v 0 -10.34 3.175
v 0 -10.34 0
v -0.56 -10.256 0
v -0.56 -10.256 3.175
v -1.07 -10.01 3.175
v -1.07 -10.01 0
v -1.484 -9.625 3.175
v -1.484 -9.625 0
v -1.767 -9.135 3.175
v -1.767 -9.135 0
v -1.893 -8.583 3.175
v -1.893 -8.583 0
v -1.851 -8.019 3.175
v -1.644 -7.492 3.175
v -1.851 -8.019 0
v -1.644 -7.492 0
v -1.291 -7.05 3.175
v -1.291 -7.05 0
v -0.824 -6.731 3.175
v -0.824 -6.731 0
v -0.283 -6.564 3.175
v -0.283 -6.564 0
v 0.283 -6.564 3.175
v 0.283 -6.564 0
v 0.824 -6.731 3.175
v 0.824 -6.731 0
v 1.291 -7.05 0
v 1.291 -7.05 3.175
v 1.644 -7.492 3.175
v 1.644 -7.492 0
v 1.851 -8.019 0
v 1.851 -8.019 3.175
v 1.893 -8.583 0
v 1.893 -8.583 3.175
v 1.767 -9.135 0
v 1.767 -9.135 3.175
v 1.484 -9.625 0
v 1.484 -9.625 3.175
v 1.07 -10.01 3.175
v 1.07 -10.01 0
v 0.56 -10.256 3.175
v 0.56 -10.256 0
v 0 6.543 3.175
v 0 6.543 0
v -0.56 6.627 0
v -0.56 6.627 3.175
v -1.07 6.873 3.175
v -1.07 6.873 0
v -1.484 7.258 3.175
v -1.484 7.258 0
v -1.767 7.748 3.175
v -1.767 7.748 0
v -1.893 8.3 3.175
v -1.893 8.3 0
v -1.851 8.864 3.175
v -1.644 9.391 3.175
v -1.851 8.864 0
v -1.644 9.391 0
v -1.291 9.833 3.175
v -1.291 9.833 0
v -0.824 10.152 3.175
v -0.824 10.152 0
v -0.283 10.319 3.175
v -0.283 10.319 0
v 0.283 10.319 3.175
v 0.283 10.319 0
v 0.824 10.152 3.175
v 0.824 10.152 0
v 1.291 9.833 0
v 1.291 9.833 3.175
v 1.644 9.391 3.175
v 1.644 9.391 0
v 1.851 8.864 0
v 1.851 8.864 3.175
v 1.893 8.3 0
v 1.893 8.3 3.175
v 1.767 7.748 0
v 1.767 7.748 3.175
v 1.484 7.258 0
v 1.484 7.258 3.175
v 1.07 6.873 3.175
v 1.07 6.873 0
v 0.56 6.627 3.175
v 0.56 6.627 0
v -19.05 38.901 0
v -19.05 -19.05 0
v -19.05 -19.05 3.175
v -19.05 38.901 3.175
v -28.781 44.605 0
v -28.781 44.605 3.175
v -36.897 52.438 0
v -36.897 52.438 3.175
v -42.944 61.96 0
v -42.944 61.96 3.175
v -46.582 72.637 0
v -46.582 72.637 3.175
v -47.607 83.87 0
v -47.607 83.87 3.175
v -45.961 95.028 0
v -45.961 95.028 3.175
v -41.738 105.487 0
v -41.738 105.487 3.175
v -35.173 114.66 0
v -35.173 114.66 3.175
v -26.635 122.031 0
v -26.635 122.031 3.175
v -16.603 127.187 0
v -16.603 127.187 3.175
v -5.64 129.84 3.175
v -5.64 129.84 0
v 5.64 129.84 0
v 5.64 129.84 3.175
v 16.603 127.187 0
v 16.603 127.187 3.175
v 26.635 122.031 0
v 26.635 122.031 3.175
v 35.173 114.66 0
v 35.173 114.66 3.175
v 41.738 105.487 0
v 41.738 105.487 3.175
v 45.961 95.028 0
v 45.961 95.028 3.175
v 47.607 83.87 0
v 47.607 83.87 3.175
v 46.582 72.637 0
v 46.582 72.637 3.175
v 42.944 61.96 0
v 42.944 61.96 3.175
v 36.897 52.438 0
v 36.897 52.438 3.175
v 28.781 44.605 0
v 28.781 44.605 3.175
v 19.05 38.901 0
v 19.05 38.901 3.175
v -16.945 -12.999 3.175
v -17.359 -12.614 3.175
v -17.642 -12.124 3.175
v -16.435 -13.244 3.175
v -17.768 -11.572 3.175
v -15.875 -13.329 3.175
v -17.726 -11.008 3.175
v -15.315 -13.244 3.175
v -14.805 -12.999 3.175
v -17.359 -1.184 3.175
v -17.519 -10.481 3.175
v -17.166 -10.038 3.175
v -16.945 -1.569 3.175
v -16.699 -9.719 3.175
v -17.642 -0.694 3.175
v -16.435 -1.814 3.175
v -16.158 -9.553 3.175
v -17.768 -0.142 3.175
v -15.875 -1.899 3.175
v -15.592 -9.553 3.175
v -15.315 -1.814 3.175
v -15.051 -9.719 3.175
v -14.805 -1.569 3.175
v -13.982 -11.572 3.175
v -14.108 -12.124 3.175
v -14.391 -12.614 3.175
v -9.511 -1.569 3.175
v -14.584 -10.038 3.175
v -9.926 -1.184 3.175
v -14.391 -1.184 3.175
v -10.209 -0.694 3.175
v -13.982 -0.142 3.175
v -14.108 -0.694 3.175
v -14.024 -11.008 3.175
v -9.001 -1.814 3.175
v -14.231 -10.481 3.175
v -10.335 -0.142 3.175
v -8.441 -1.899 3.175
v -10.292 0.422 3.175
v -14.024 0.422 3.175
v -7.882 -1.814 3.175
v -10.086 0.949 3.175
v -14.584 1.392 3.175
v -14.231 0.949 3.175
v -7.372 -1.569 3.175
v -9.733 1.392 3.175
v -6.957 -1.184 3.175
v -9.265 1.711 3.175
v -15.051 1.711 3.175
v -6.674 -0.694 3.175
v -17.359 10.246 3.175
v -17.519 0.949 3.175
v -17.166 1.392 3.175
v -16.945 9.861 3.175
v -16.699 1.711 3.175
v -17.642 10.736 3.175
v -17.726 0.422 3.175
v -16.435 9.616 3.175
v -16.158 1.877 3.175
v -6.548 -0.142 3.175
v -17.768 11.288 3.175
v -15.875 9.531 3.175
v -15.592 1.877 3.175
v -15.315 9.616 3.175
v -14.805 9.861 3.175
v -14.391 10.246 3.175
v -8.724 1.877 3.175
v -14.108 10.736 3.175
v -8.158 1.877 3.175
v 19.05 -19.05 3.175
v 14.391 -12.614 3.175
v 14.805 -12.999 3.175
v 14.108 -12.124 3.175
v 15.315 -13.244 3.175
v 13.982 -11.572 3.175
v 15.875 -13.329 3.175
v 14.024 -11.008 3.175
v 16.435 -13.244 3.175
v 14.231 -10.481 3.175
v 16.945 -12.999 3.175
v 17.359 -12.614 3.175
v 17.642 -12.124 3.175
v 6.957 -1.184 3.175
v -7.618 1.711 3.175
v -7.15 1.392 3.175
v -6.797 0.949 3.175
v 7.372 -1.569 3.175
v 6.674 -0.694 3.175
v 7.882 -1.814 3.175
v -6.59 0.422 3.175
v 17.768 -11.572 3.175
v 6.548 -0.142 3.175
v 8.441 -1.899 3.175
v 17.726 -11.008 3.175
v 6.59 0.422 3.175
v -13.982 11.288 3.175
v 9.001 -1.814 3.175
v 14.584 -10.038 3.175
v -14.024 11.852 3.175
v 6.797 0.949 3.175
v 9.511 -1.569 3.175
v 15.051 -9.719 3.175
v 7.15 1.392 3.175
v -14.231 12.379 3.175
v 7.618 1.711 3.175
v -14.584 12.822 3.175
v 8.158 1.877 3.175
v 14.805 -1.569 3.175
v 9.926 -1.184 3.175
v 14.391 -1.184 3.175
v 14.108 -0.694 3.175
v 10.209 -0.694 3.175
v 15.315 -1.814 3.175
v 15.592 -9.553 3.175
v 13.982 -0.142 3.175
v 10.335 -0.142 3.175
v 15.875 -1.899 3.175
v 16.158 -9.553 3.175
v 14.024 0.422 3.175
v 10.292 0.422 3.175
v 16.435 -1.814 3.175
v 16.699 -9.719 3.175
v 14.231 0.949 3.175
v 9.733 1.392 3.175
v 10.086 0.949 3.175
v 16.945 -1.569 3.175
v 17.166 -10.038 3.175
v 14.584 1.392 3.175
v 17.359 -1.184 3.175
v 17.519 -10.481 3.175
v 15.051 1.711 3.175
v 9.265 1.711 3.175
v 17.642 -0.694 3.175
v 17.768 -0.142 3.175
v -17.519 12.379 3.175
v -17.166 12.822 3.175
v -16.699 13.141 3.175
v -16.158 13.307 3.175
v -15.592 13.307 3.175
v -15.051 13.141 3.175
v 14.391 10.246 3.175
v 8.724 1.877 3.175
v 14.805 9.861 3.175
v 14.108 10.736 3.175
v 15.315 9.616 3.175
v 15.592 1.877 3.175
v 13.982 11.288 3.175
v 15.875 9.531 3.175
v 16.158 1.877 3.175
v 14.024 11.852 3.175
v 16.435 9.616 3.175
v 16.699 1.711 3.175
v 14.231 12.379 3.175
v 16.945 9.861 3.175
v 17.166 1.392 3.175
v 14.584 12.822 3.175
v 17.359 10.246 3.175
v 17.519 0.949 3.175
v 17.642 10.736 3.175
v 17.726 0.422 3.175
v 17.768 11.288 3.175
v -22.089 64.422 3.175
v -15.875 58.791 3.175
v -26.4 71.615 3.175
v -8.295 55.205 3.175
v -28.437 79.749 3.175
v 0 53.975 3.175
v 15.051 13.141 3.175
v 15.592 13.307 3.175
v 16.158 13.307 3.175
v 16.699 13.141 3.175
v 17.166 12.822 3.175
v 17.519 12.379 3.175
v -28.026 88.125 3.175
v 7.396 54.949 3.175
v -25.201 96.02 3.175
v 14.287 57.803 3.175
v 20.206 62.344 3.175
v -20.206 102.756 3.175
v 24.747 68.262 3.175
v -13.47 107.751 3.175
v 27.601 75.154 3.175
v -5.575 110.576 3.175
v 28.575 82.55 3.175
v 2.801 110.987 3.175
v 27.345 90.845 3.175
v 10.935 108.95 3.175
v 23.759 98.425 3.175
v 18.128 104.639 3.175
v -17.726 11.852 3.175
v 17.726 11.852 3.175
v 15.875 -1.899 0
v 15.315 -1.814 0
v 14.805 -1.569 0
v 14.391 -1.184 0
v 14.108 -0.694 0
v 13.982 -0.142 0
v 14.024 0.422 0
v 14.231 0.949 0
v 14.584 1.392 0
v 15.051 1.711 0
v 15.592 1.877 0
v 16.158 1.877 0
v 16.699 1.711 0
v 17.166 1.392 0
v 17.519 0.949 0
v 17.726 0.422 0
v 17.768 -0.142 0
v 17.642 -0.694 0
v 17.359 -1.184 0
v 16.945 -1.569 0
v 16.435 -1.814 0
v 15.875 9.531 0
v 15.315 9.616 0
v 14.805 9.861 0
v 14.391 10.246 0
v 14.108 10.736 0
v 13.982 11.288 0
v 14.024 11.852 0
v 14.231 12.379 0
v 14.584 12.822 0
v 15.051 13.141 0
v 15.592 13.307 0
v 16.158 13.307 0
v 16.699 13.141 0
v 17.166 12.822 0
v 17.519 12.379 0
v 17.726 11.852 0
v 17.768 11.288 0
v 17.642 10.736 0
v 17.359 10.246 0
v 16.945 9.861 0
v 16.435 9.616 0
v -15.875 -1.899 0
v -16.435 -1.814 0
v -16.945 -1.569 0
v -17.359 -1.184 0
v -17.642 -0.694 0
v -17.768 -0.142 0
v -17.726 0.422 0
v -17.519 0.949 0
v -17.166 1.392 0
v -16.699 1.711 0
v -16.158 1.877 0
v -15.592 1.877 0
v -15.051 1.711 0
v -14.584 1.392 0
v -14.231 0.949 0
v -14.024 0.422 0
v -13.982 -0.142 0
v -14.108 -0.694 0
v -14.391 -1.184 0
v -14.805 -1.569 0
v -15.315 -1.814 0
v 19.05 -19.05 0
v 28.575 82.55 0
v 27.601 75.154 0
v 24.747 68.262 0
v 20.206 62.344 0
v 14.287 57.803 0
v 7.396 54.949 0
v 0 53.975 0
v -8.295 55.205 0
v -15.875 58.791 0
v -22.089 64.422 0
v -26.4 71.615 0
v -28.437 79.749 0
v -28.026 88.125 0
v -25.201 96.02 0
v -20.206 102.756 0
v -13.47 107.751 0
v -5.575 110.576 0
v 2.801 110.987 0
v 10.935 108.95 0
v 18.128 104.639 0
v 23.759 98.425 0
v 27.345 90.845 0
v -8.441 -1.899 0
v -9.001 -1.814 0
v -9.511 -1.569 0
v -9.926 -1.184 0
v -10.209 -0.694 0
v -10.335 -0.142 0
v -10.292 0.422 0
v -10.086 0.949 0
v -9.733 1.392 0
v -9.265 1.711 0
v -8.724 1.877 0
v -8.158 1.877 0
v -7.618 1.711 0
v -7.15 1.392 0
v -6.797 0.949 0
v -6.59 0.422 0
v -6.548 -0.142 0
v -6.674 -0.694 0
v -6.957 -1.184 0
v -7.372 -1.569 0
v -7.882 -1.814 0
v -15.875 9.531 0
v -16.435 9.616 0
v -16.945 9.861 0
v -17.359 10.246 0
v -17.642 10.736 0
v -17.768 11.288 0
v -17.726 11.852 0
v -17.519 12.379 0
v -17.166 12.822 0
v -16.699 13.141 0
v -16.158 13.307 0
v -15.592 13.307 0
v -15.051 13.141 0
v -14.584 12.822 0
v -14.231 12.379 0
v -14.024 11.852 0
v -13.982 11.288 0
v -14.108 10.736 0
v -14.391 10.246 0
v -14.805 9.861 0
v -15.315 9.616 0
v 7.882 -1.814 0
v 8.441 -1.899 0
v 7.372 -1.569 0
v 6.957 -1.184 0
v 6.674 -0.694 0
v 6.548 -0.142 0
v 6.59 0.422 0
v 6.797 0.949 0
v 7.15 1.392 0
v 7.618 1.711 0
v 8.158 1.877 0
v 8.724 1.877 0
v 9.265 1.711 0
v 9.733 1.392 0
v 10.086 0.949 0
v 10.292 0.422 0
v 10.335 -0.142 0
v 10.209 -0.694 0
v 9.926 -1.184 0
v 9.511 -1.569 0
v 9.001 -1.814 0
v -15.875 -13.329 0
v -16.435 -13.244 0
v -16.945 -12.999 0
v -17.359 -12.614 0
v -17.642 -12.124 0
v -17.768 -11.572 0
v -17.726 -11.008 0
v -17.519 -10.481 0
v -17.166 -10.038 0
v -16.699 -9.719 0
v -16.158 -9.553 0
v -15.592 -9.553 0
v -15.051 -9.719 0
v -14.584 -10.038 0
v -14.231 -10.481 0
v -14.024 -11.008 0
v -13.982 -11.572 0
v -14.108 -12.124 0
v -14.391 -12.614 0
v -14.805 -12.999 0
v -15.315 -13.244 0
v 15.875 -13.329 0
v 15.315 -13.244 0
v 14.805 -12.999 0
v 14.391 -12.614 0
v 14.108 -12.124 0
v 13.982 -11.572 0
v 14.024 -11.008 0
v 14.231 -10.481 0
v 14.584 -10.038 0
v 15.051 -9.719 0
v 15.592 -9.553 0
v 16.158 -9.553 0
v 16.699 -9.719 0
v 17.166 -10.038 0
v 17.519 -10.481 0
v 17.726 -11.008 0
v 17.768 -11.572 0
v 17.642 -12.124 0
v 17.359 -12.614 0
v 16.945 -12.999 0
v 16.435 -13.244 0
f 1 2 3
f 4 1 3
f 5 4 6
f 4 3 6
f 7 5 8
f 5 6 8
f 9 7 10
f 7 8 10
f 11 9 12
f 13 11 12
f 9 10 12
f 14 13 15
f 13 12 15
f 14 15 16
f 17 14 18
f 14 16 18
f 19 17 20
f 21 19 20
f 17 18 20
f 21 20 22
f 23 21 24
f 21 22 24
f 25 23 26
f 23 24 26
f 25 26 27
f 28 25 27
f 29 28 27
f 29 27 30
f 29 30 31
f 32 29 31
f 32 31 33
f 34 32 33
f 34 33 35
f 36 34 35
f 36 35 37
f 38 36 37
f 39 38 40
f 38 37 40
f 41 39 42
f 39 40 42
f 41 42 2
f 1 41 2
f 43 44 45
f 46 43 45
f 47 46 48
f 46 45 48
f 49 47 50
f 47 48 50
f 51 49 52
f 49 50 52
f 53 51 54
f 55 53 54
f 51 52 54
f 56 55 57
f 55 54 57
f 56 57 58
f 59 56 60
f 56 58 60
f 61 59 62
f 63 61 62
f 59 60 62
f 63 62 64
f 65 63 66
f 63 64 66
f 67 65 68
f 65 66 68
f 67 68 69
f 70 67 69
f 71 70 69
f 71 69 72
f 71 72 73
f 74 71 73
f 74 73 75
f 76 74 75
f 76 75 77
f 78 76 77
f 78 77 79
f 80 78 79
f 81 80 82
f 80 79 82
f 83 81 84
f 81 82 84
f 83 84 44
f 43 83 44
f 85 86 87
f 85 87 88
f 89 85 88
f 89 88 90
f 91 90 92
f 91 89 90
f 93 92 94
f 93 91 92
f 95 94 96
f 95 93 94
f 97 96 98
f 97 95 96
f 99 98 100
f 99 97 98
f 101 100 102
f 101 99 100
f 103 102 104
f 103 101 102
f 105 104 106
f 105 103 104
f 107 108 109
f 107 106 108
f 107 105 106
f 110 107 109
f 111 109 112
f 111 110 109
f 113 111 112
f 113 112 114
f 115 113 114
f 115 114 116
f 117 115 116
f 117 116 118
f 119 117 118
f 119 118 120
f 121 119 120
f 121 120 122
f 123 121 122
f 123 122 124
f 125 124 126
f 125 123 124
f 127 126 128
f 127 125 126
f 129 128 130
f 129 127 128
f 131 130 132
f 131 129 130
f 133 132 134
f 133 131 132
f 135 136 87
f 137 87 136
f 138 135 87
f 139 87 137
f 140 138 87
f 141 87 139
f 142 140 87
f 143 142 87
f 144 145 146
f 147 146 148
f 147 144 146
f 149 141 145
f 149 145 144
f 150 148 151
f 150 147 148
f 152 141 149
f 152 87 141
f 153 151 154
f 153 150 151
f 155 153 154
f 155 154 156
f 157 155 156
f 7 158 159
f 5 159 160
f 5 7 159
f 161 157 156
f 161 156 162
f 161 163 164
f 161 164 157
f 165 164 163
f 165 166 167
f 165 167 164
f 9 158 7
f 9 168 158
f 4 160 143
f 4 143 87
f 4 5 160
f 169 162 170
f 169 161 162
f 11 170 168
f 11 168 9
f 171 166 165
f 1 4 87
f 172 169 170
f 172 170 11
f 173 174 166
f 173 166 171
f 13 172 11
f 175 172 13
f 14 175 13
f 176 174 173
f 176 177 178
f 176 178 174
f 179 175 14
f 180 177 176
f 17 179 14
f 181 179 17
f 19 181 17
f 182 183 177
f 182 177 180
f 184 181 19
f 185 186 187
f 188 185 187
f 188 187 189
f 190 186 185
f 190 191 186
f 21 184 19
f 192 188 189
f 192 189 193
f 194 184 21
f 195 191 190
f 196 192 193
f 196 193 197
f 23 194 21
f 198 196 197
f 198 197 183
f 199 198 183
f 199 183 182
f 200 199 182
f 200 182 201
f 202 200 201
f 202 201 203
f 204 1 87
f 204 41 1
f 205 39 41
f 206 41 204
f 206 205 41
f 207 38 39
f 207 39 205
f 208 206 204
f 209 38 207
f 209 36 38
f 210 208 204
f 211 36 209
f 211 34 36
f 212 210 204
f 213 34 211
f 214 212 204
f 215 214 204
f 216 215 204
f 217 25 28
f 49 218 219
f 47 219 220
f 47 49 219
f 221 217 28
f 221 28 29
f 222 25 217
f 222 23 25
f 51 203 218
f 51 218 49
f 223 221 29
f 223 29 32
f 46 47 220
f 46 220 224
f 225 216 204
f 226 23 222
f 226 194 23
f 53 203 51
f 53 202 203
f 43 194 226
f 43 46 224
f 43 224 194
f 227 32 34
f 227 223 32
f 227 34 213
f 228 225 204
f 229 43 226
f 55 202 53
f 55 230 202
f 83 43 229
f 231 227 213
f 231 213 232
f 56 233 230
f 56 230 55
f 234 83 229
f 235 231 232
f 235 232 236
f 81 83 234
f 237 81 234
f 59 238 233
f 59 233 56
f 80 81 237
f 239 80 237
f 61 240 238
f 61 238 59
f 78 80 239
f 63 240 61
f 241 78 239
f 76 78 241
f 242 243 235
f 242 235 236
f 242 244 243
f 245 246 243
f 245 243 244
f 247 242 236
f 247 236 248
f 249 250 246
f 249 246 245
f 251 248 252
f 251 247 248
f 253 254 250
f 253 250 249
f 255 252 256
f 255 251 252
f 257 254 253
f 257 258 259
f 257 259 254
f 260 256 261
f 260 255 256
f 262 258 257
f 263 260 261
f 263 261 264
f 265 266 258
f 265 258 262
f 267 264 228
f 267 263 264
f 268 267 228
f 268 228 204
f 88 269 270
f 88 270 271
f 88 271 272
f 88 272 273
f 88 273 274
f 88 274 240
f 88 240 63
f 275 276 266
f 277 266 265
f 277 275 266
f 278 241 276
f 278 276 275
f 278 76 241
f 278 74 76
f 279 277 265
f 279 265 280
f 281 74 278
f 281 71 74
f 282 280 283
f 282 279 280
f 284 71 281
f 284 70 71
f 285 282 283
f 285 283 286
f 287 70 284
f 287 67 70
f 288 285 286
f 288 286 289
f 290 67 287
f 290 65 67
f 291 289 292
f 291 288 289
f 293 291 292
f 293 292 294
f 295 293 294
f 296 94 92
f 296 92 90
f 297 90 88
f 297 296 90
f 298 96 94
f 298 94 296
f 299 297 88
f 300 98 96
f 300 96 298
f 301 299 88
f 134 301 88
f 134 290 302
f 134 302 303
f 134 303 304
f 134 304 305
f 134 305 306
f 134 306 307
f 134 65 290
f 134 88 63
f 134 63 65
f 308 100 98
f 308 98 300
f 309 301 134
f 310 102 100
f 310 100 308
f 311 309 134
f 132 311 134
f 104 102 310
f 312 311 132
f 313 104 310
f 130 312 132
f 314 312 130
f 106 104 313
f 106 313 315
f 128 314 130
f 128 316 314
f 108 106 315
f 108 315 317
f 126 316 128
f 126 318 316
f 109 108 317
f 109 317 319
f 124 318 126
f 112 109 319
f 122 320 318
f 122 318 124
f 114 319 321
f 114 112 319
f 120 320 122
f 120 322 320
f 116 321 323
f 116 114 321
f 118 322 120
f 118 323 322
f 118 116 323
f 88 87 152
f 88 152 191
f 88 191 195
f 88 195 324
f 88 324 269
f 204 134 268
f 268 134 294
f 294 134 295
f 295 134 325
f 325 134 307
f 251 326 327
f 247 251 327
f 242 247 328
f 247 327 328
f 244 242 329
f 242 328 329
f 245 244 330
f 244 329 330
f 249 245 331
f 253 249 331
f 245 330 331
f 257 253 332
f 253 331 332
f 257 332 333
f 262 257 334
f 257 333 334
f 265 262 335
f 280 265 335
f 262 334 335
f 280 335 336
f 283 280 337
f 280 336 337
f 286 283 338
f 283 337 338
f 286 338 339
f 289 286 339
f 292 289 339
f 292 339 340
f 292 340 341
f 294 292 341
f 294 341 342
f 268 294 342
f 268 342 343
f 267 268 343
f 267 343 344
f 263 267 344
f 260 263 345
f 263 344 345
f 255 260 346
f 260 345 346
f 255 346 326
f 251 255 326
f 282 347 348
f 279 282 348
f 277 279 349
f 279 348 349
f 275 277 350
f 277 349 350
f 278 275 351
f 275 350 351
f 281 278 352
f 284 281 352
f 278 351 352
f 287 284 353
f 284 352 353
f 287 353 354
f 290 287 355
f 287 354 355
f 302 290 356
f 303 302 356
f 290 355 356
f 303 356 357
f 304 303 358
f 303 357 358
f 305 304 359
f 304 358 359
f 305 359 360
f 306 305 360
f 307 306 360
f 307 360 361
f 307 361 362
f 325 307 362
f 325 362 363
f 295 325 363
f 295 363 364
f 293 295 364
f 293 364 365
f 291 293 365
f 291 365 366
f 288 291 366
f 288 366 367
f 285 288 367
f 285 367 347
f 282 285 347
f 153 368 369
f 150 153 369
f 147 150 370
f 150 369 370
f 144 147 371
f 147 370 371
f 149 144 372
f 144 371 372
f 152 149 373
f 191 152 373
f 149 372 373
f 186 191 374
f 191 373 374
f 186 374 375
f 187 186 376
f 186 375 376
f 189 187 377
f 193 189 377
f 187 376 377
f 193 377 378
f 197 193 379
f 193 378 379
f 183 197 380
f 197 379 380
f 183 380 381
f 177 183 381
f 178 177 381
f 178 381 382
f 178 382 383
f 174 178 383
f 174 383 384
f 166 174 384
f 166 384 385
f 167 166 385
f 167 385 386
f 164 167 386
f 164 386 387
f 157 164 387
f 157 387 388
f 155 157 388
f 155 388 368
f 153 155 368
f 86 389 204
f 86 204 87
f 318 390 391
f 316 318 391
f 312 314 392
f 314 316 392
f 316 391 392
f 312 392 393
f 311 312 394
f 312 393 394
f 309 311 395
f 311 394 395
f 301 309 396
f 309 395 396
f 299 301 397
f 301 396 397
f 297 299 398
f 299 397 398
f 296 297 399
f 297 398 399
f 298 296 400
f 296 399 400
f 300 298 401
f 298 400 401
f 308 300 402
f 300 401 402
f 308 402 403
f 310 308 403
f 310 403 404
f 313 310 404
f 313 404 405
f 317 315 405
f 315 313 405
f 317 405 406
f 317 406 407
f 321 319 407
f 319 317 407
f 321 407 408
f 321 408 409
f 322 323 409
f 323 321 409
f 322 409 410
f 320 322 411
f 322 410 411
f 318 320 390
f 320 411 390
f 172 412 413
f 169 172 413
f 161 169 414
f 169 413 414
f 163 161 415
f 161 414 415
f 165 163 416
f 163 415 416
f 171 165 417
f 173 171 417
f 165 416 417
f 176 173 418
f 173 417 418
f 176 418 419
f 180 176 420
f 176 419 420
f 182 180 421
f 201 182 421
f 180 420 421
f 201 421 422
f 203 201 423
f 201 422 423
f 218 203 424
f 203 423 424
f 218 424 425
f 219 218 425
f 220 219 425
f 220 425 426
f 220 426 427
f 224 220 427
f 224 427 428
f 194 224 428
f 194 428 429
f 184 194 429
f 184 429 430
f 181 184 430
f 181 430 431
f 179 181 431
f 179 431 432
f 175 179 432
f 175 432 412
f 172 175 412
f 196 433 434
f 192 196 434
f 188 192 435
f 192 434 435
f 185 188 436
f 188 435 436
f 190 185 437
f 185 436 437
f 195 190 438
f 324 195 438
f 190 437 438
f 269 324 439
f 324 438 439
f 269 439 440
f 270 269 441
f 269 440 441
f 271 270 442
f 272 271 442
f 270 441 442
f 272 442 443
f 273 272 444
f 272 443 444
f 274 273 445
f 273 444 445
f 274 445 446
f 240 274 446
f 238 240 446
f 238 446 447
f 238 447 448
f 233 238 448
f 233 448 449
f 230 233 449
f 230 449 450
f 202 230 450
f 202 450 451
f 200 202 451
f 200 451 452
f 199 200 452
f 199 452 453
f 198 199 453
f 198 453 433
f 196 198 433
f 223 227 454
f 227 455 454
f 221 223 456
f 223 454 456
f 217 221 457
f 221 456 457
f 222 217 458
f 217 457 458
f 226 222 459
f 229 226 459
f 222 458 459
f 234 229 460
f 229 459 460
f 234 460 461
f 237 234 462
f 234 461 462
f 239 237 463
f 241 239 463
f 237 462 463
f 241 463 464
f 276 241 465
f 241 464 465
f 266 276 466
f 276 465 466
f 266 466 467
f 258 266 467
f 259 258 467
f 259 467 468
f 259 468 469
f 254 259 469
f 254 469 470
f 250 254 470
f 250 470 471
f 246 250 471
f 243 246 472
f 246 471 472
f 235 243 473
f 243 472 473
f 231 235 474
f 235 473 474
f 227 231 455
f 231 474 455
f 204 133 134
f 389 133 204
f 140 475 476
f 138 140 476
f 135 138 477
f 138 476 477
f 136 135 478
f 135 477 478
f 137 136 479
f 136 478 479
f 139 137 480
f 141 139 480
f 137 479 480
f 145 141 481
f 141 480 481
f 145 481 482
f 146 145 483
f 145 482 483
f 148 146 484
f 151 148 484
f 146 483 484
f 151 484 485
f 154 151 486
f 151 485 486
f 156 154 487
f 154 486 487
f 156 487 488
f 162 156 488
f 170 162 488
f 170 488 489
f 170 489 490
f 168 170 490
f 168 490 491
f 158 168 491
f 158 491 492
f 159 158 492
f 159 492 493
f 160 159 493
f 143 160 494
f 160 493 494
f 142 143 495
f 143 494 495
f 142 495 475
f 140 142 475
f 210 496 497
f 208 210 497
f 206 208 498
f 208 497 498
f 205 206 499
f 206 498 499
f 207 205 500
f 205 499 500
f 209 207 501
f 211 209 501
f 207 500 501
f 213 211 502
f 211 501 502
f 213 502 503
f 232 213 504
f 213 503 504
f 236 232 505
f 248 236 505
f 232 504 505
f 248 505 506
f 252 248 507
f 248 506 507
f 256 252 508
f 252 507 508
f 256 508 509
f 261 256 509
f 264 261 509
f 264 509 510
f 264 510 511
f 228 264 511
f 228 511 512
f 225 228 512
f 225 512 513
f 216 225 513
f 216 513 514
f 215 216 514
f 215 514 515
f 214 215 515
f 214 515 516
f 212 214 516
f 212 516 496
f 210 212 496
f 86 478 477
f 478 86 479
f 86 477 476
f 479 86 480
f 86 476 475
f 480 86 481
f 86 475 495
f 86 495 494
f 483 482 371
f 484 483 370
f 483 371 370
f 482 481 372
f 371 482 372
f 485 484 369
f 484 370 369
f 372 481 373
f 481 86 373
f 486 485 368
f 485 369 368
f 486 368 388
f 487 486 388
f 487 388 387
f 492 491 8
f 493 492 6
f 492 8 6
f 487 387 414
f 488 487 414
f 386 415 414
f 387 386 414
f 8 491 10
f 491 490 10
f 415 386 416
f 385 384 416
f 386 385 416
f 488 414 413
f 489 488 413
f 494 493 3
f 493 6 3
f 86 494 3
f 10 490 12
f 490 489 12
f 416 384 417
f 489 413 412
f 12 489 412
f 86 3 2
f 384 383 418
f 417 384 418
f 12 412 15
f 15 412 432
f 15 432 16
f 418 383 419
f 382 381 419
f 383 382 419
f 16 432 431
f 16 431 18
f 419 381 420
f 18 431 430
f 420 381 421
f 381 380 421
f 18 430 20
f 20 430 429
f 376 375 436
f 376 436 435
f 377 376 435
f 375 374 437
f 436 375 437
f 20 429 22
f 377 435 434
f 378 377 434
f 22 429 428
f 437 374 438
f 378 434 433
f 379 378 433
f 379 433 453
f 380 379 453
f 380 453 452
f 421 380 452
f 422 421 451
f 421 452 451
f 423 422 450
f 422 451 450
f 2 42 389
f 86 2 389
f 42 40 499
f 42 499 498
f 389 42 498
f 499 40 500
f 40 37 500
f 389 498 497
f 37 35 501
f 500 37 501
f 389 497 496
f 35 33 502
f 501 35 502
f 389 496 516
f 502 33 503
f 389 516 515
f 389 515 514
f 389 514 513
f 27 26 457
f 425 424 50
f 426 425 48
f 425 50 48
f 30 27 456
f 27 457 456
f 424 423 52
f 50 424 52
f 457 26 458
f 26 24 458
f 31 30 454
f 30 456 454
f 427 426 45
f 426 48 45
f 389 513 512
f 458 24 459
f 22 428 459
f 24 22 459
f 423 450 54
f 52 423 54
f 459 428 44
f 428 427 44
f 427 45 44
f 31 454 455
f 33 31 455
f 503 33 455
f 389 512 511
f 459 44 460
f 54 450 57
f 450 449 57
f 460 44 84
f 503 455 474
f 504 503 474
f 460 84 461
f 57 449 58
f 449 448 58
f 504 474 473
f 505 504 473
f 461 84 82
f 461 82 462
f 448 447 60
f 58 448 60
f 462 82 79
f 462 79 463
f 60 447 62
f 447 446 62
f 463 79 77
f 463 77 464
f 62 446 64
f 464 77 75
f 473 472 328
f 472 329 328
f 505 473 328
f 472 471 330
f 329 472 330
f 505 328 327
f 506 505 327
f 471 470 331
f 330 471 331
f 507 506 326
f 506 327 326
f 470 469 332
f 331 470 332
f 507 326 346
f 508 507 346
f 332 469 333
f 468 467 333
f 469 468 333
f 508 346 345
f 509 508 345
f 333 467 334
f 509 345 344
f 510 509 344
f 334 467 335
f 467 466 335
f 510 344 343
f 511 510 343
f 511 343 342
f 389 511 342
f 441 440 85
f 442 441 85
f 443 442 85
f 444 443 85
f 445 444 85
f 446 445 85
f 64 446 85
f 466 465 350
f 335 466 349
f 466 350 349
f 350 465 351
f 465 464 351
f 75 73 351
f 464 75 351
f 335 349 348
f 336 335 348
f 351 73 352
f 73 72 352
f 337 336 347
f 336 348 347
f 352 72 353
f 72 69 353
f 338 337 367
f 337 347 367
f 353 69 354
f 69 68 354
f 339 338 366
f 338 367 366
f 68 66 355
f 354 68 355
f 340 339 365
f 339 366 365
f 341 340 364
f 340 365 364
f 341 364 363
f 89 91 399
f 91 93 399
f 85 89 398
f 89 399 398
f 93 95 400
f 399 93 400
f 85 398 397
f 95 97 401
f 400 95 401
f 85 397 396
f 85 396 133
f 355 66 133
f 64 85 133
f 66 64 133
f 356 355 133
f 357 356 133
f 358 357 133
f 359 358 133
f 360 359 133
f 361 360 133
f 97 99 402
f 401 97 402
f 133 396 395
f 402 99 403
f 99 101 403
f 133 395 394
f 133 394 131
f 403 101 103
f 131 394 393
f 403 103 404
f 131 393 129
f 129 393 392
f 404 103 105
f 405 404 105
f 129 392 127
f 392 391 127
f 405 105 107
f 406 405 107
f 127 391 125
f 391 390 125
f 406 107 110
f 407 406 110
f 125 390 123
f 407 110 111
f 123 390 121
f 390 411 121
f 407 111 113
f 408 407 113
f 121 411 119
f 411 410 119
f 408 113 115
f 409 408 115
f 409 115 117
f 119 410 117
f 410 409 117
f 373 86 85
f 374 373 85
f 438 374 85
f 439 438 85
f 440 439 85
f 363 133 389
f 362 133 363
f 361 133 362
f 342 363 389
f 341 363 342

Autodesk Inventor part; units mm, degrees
ref_plane "YZ Plane" through (0, 0, 0) normal (1, 0, 0) x (0, 1, 0)
ref_plane "XZ Plane" through (0, 0, 0) normal (0, 1, 0) x (-1, 0, 0)
ref_plane "XY Plane" through (0, 0, 0) normal (0, 0, 1) x (1, 0, 0)
sketch "Sketch1" plane through (0, 0, 0) normal (0, 0, 1) x (1, 0, 0)
  line L0 (19.05, -19.05) -> (-19.05, -19.05)
  line L1 (-19.05, -19.05) -> (-19.05, 19.05)
  line L2 (-19.05, 19.05) -> (19.05, 19.05)
  line L3 (19.05, 19.05) -> (19.05, -19.05)
  line L4 (19.05, -19.05) -> (-19.05, 19.05) construction
  line L5 (-19.05, -19.05) -> (19.05, 19.05) construction
  line L6 (-19.05, 19.05) -> (19.05, 19.05)
  line L7 (19.05, 19.05) -> (19.05, 44.45)
  line L8 (19.05, 44.45) -> (-19.05, 44.45)
  line L9 (-19.05, 44.45) -> (-19.05, 19.05)
  line L10 (0, 19.05) -> (0, 82.55)
  circle A0 centre (0, 82.55) radius 47.625
  circle A1 centre (0, 82.55) radius 28.575
  point P0 (0, 0)
  dimension "d0" = 38.1
  dimension "d1" = 38.1
  dimension "d2" = 25.4
  dimension "d3" = 63.5
  dimension "d4" = 95.25
  dimension "d5" = 57.15
extrude "Extrusion1" add sketch "Sketch1" along normal blind 3.175
sketch "Sketch2" plane through (0, 0, 3.175) normal (0, 0, 1) x (1, 0, 0)
  circle A0 centre (0, 82.55) radius 28.575 construction
  arc A1 (19.05, 38.901) -> (-19.05, 38.901) centre (0, 82.55) ccw construction
  line L0 (-19.05, 38.901) -> (-19.05, -19.05) construction
  line L1 (-19.05, -19.05) -> (19.05, -19.05) construction
  line L2 (19.05, -19.05) -> (19.05, 38.901) construction
  line L3 (-19.05, -19.05) -> (19.05, -19.05) construction
  line L4 (19.05, -19.05) -> (19.05, 19.05) construction
  line L5 (19.05, 19.05) -> (-19.05, 19.05) construction
  line L6 (-19.05, 19.05) -> (-19.05, -19.05) construction
  line L7 (15.875, -11.43) -> (-15.875, -11.43) construction
  line L8 (-15.875, -11.43) -> (-15.875, 11.43) construction
  line L9 (-15.875, 11.43) -> (15.875, 11.43) construction
  line L10 (15.875, 11.43) -> (15.875, -11.43) construction
  line L11 (15.875, -11.43) -> (-15.875, 11.43) construction
  line L12 (-15.875, -11.43) -> (15.875, 11.43) construction
  line L13 (11.43, -15.875) -> (-11.43, -15.875) construction
  line L14 (-11.43, -15.875) -> (-11.43, 15.875) construction
  line L15 (-11.43, 15.875) -> (11.43, 15.875) construction
  line L16 (11.43, 15.875) -> (11.43, -15.875) construction
  line L17 (11.43, -15.875) -> (-11.43, 15.875) construction
  line L18 (-11.43, -15.875) -> (11.43, 15.875) construction
  line L19 (0, -8.4414) -> (8.4414, 0) construction
  line L20 (8.4414, 0) -> (0, 8.4414) construction
  line L21 (0, 8.4414) -> (-8.4414, 0) construction
  line L22 (-8.4414, 0) -> (0, -8.4414) construction
  line L23 (-5.969, -5.969) -> (5.969, 5.969) construction
  line L24 (5.969, -5.969) -> (-5.969, 5.969) construction
  line L25 (-8.4414, -8.4414) -> (8.4414, -8.4414) construction
  line L26 (8.4414, -8.4414) -> (8.4414, 8.4414) construction
  line L27 (8.4414, 8.4414) -> (-8.4414, 8.4414) construction
  line L28 (-8.4414, 8.4414) -> (-8.4414, -8.4414) construction
  line L29 (-8.4414, -8.4414) -> (8.4414, 8.4414) construction
  line L30 (8.4414, -8.4414) -> (-8.4414, 8.4414) construction
  point P0 (0, 0)
  point P1 (0, 8.4414)
  point P2 (8.4414, 0)
  point P3 (-15.875, 0)
  point P4 (15.875, 0)
  dimension "d8" = 38.1
  dimension "d9" = 38.1
  dimension "d10" = 31.75
  dimension "d11" = 22.86
  dimension "d12" = 22.86
  dimension "d13" = 31.75
  dimension "d14" = 11.938
  dimension "d15" = 11.938
  dimension "d16" = 16.8829
  dimension "d17" = 16.8829
  dimension "d18" = 4.445
  dimension "d19" = 7.4336
  dimension "d20" = 5.969
  dimension "d21" = 5.969
  dimension "d22" = 4.445
  dimension "d23" = 7.4336
  dimension "d24" = 9.906
  dimension "d25" = 9.906
  dimension "d26" = 21.844
  dimension "d27" = 21.844
  dimension "d28" = 3.175
  dimension "d29" = 27.4914
hole "Hole1" at (-15.875, 11.43, 3.175) at (-15.875, 0, 3.175) at (-15.875, -11.43, 3.175) at (15.875, -11.43, 3.175) at (15.875, 0, 3.175) at (15.875, 11.43, 3.175) at (0, 8.4414, 3.175) at (0, -8.4414, 3.175) at (8.4414, 0, 3.175) at (-8.4414, 0, 3.175) direction (0, 0, -1) diameter 3.7973 end through all
properties part number "goniometer_stage_top_v1" material "Stainless Steel AISI 304"
